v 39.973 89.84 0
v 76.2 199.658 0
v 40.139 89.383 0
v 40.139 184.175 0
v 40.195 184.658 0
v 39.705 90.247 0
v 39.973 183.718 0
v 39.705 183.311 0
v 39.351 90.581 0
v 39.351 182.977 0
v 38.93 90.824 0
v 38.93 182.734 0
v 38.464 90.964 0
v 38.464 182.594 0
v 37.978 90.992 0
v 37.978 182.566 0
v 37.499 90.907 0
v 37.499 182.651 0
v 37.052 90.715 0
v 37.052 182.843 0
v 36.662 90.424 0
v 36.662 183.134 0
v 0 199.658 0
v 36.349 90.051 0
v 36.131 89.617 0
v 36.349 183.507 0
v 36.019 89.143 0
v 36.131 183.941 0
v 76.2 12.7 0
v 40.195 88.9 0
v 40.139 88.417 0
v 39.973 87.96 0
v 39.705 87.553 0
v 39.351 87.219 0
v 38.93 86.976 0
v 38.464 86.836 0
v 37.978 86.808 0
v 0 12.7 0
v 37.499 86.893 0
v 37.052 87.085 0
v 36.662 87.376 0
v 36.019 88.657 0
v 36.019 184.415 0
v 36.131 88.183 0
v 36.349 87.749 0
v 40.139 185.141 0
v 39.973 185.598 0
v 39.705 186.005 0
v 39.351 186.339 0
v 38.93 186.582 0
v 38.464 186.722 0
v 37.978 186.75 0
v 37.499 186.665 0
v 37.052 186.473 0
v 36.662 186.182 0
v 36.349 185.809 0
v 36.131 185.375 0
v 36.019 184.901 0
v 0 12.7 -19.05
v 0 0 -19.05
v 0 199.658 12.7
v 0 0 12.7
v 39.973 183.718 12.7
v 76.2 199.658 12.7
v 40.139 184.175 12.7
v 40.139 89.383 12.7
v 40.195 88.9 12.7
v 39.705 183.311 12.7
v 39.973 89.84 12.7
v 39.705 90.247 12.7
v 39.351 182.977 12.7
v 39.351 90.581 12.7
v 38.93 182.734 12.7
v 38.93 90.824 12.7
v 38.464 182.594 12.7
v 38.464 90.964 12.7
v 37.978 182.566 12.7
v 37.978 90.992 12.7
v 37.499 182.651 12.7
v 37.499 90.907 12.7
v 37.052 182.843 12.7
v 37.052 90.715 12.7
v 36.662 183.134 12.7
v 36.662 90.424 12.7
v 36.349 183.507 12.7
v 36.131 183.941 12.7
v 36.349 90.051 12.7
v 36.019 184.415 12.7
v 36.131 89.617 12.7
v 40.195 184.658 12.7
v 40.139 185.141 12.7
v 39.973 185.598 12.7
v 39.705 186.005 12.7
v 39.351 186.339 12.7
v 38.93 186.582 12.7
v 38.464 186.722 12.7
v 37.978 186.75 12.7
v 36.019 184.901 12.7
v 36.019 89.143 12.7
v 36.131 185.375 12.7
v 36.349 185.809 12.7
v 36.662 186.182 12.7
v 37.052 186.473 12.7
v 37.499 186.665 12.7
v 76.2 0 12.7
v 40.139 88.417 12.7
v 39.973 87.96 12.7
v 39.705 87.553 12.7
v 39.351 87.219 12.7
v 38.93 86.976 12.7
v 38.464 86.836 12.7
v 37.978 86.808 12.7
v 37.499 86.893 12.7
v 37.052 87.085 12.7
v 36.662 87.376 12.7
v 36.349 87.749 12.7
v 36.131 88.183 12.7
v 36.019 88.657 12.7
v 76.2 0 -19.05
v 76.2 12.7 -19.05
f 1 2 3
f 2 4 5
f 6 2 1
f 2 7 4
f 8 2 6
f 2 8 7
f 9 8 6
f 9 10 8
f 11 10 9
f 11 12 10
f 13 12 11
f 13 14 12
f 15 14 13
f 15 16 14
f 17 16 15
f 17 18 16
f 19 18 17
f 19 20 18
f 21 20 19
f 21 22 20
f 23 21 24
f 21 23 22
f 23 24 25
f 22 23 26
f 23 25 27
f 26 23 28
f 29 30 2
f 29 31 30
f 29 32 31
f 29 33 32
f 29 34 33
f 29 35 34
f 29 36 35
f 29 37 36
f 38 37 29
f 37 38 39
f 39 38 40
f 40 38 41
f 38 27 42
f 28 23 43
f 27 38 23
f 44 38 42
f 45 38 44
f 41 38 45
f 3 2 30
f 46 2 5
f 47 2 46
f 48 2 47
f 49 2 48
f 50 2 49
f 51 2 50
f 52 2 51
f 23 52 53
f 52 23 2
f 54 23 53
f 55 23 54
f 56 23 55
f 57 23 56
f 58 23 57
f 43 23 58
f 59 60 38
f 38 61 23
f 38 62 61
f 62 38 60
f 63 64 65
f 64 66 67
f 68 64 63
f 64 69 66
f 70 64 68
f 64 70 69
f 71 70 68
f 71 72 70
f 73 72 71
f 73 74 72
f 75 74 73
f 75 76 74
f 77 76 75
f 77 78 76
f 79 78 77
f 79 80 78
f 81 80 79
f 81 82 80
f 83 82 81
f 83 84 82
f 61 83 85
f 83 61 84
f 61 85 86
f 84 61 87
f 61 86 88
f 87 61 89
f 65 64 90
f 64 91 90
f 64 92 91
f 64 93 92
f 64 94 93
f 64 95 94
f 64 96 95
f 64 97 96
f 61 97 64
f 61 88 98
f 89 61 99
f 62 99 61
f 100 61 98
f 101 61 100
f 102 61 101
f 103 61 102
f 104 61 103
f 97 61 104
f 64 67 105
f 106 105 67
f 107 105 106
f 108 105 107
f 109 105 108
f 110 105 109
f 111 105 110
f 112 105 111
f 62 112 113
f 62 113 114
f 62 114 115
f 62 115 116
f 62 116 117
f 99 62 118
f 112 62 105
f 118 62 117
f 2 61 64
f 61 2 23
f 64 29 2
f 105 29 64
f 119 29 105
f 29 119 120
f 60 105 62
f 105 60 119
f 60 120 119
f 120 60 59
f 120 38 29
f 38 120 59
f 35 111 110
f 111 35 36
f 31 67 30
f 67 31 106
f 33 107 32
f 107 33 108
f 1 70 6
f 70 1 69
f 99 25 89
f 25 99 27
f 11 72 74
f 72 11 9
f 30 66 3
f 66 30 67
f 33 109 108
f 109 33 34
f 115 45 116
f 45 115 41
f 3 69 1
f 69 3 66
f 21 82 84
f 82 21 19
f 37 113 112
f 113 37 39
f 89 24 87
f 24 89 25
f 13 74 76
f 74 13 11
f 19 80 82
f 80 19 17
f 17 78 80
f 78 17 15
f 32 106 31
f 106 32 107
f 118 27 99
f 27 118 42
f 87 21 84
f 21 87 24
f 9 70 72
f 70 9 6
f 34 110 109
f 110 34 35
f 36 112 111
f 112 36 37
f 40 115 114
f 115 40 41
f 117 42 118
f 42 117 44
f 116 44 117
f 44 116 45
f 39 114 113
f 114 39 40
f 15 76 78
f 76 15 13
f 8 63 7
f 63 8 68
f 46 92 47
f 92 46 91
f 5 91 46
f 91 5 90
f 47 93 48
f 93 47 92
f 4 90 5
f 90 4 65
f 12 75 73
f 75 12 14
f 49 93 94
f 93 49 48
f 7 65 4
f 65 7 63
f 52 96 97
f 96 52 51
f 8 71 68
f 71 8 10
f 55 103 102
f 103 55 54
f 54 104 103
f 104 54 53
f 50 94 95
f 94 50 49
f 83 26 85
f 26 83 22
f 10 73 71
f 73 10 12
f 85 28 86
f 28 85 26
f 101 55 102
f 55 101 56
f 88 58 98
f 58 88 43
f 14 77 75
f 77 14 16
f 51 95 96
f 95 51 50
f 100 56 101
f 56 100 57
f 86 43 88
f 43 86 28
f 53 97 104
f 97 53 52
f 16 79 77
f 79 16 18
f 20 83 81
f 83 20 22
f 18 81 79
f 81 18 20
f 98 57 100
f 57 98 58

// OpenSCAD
$fa=6*1;
$fs=0.5*1;

// Stile Width (in inches)
x_in=3.0;

// Bottom Hole (in inches)
y_in=3.0;

// Thickness (in inches)
z_in=0.5;

// Hole Diameter (in inches)
d_in=0.165;

// Center to Center in inches
CTC_in=3.77;

mm_per_inch=25.4*1;
x_mm = x_in*mm_per_inch; 
y_mm = y_in*mm_per_inch; 
z_mm = z_in*mm_per_inch; 
d_mm = d_in*mm_per_inch; 
CTC_mm = CTC_in*mm_per_inch; 
//total_height=(CTC+1+z_in)*mm_per_inch;
difference()
{
    union() {
    // build main plate
    linear_extrude(z_mm) 
    square([x_mm, (z_mm+y_mm+CTC_mm+15)]);


    translate([0,0,-0.75*mm_per_inch]) 
    linear_extrude(0.75*mm_per_inch) square([x_mm, (z_mm)]);
    }

    // Drill bottom hole
    translate ([(x_mm/2), (z_mm+y_mm), 0])
    cylinder(h=z_mm*4, d=d_mm, center=true);


    // Drill top hole
    translate ([(x_mm/2), (z_mm+y_mm+CTC_mm), 0])
    cylinder(h=z_mm*4, d=d_mm, center=true);
}
